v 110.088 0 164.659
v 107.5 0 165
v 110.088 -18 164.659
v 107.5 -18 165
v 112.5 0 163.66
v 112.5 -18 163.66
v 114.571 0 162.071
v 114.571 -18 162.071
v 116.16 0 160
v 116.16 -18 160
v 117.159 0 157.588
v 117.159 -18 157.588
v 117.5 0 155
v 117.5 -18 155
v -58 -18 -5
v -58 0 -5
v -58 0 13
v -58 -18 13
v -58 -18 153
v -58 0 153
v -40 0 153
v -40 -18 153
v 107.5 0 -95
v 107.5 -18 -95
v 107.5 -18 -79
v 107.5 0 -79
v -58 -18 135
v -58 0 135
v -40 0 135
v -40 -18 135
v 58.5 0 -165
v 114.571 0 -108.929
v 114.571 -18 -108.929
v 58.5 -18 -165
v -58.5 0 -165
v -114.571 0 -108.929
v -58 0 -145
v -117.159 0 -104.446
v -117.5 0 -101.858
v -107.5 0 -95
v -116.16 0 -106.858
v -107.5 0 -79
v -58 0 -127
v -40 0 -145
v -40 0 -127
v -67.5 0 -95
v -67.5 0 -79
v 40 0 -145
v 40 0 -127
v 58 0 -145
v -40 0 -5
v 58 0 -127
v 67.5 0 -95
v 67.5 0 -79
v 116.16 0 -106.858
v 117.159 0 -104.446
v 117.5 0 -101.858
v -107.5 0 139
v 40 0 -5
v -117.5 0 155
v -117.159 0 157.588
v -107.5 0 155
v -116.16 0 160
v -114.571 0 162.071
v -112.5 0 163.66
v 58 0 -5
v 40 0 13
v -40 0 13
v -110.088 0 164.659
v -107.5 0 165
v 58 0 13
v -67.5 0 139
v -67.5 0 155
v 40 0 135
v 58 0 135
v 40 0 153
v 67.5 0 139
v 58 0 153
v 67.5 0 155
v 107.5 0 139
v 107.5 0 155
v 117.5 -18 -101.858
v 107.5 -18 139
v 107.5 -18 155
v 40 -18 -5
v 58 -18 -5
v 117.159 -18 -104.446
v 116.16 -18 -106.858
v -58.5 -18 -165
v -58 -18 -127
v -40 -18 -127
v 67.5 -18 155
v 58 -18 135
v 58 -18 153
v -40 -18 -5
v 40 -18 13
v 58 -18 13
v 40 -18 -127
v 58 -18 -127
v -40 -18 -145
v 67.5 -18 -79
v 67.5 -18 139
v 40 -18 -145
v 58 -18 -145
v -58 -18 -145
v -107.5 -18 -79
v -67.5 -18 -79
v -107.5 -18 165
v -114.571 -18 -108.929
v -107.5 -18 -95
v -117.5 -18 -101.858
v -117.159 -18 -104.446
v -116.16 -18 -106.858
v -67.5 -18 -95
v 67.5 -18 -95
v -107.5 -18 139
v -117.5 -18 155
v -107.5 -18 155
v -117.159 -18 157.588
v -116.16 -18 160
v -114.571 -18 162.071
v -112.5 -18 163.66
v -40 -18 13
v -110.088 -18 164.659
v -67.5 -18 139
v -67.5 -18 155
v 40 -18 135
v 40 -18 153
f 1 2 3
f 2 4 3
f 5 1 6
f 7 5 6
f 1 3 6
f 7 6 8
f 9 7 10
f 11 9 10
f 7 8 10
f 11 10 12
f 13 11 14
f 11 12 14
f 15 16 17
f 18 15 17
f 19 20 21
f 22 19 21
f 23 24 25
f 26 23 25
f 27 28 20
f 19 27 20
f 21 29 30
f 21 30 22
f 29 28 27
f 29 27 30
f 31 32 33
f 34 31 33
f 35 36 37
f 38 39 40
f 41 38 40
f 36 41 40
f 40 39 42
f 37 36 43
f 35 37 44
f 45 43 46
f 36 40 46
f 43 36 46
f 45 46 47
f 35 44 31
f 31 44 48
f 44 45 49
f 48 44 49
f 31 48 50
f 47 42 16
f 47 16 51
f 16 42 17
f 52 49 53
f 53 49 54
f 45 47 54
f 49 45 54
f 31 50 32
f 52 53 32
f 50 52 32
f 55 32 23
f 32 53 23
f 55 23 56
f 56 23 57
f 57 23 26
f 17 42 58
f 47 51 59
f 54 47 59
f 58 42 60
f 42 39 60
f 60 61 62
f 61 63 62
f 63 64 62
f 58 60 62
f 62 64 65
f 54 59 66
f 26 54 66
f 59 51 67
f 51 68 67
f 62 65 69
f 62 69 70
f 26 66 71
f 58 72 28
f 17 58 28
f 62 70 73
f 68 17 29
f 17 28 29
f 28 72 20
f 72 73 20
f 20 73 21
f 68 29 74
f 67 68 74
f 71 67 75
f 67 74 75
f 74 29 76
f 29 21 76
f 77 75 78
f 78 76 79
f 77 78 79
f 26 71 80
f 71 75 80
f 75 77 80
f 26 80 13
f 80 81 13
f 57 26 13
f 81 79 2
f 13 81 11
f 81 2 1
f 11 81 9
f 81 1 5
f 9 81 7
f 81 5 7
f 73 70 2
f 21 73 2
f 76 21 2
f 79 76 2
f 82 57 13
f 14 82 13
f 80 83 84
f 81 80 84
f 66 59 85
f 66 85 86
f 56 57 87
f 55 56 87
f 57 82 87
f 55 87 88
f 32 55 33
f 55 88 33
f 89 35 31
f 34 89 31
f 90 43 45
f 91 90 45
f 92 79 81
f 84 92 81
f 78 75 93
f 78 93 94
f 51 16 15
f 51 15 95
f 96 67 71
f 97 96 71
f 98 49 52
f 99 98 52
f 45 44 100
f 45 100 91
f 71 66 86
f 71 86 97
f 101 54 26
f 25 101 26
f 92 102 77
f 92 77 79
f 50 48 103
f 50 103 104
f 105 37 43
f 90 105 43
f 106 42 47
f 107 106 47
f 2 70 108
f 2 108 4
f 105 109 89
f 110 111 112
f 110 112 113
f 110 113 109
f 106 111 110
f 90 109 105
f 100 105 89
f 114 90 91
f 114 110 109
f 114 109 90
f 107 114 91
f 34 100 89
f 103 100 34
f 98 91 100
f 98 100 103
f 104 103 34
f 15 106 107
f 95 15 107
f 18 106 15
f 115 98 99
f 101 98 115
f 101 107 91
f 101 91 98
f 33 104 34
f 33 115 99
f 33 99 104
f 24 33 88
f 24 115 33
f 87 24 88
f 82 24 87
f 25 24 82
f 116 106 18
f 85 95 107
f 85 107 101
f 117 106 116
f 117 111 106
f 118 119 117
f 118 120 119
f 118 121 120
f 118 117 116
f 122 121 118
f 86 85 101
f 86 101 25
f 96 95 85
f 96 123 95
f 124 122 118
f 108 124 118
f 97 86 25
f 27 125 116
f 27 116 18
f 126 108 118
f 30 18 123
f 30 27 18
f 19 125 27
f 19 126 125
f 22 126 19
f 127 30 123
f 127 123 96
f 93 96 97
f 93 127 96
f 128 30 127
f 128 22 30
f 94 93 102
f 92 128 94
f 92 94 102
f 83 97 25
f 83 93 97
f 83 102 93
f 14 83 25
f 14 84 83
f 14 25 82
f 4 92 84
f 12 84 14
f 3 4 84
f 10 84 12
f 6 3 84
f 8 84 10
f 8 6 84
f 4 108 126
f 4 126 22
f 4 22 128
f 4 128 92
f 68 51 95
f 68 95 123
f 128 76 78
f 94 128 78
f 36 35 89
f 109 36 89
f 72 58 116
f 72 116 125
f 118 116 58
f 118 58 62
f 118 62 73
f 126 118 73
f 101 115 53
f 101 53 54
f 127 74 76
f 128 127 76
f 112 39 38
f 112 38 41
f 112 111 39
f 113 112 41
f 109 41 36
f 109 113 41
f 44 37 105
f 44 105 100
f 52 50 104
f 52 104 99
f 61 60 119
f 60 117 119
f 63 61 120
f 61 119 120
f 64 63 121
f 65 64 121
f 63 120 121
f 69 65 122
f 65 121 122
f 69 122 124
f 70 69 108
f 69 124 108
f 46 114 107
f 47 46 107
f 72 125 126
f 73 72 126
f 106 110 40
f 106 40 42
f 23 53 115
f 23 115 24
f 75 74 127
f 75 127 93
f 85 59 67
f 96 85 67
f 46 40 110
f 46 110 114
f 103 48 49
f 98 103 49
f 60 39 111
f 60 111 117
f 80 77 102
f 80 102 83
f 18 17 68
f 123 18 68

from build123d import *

# Parameters (mm, degrees)
F0_W     = 235
F0_H     = 330
F0_W_2   = 40
F0_H_2   = 16
F0_W_3   = 18
F0_H_3   = 18
F1_DEPTH = 18
F2_SIZE  = 59
F3_R     = 10


with BuildPart() as f1:
    # F0 (on Front) → F1 (new body)
    with BuildSketch(Plane.XZ):
        Rectangle(F0_W, F0_H)
        with Locations((-87.5, -87)):
            Rectangle(F0_W_2, F0_H_2, mode=Mode.SUBTRACT)
        with Locations((-49, -136)):
            Rectangle(F0_W_3, F0_H_3, mode=Mode.SUBTRACT)
        with Locations((49, -136)):
            Rectangle(F0_W_3, F0_H_3, mode=Mode.SUBTRACT)
        with Locations((87.5, -87)):
            Rectangle(F0_W_2, F0_H_2, mode=Mode.SUBTRACT)
        with Locations((-49, 4)):
            Rectangle(F0_W_3, F0_H_3, mode=Mode.SUBTRACT)
        with Locations((-87.5, 147)):
            Rectangle(F0_W_2, F0_H_2, mode=Mode.SUBTRACT)
        with Locations((-49, 144)):
            Rectangle(F0_W_3, F0_H_3, mode=Mode.SUBTRACT)
        with Locations((49, 4)):
            Rectangle(F0_W_3, F0_H_3, mode=Mode.SUBTRACT)
        with Locations((49, 144)):
            Rectangle(F0_W_3, F0_H_3, mode=Mode.SUBTRACT)
        with Locations((87.5, 147)):
            Rectangle(F0_W_2, F0_H_2, mode=Mode.SUBTRACT)
    extrude(amount=F1_DEPTH)

    # F2
    f2_edges = [f1.edges().sort_by_distance(p)[0] for p in [
        (117.5, -9, -165),
        (-117.5, -9, -165),
    ]]
    chamfer(f2_edges, length=F2_SIZE)

    # F3
    f3_edges = [f1.edges().sort_by_distance(p)[0] for p in [
        (117.5, -9, 165),
        (117.5, -9, -106),
        (-117.5, -9, 165),
        (-117.5, -9, -106),
    ]]
    fillet(f3_edges, radius=F3_R)


solid = f1.part
